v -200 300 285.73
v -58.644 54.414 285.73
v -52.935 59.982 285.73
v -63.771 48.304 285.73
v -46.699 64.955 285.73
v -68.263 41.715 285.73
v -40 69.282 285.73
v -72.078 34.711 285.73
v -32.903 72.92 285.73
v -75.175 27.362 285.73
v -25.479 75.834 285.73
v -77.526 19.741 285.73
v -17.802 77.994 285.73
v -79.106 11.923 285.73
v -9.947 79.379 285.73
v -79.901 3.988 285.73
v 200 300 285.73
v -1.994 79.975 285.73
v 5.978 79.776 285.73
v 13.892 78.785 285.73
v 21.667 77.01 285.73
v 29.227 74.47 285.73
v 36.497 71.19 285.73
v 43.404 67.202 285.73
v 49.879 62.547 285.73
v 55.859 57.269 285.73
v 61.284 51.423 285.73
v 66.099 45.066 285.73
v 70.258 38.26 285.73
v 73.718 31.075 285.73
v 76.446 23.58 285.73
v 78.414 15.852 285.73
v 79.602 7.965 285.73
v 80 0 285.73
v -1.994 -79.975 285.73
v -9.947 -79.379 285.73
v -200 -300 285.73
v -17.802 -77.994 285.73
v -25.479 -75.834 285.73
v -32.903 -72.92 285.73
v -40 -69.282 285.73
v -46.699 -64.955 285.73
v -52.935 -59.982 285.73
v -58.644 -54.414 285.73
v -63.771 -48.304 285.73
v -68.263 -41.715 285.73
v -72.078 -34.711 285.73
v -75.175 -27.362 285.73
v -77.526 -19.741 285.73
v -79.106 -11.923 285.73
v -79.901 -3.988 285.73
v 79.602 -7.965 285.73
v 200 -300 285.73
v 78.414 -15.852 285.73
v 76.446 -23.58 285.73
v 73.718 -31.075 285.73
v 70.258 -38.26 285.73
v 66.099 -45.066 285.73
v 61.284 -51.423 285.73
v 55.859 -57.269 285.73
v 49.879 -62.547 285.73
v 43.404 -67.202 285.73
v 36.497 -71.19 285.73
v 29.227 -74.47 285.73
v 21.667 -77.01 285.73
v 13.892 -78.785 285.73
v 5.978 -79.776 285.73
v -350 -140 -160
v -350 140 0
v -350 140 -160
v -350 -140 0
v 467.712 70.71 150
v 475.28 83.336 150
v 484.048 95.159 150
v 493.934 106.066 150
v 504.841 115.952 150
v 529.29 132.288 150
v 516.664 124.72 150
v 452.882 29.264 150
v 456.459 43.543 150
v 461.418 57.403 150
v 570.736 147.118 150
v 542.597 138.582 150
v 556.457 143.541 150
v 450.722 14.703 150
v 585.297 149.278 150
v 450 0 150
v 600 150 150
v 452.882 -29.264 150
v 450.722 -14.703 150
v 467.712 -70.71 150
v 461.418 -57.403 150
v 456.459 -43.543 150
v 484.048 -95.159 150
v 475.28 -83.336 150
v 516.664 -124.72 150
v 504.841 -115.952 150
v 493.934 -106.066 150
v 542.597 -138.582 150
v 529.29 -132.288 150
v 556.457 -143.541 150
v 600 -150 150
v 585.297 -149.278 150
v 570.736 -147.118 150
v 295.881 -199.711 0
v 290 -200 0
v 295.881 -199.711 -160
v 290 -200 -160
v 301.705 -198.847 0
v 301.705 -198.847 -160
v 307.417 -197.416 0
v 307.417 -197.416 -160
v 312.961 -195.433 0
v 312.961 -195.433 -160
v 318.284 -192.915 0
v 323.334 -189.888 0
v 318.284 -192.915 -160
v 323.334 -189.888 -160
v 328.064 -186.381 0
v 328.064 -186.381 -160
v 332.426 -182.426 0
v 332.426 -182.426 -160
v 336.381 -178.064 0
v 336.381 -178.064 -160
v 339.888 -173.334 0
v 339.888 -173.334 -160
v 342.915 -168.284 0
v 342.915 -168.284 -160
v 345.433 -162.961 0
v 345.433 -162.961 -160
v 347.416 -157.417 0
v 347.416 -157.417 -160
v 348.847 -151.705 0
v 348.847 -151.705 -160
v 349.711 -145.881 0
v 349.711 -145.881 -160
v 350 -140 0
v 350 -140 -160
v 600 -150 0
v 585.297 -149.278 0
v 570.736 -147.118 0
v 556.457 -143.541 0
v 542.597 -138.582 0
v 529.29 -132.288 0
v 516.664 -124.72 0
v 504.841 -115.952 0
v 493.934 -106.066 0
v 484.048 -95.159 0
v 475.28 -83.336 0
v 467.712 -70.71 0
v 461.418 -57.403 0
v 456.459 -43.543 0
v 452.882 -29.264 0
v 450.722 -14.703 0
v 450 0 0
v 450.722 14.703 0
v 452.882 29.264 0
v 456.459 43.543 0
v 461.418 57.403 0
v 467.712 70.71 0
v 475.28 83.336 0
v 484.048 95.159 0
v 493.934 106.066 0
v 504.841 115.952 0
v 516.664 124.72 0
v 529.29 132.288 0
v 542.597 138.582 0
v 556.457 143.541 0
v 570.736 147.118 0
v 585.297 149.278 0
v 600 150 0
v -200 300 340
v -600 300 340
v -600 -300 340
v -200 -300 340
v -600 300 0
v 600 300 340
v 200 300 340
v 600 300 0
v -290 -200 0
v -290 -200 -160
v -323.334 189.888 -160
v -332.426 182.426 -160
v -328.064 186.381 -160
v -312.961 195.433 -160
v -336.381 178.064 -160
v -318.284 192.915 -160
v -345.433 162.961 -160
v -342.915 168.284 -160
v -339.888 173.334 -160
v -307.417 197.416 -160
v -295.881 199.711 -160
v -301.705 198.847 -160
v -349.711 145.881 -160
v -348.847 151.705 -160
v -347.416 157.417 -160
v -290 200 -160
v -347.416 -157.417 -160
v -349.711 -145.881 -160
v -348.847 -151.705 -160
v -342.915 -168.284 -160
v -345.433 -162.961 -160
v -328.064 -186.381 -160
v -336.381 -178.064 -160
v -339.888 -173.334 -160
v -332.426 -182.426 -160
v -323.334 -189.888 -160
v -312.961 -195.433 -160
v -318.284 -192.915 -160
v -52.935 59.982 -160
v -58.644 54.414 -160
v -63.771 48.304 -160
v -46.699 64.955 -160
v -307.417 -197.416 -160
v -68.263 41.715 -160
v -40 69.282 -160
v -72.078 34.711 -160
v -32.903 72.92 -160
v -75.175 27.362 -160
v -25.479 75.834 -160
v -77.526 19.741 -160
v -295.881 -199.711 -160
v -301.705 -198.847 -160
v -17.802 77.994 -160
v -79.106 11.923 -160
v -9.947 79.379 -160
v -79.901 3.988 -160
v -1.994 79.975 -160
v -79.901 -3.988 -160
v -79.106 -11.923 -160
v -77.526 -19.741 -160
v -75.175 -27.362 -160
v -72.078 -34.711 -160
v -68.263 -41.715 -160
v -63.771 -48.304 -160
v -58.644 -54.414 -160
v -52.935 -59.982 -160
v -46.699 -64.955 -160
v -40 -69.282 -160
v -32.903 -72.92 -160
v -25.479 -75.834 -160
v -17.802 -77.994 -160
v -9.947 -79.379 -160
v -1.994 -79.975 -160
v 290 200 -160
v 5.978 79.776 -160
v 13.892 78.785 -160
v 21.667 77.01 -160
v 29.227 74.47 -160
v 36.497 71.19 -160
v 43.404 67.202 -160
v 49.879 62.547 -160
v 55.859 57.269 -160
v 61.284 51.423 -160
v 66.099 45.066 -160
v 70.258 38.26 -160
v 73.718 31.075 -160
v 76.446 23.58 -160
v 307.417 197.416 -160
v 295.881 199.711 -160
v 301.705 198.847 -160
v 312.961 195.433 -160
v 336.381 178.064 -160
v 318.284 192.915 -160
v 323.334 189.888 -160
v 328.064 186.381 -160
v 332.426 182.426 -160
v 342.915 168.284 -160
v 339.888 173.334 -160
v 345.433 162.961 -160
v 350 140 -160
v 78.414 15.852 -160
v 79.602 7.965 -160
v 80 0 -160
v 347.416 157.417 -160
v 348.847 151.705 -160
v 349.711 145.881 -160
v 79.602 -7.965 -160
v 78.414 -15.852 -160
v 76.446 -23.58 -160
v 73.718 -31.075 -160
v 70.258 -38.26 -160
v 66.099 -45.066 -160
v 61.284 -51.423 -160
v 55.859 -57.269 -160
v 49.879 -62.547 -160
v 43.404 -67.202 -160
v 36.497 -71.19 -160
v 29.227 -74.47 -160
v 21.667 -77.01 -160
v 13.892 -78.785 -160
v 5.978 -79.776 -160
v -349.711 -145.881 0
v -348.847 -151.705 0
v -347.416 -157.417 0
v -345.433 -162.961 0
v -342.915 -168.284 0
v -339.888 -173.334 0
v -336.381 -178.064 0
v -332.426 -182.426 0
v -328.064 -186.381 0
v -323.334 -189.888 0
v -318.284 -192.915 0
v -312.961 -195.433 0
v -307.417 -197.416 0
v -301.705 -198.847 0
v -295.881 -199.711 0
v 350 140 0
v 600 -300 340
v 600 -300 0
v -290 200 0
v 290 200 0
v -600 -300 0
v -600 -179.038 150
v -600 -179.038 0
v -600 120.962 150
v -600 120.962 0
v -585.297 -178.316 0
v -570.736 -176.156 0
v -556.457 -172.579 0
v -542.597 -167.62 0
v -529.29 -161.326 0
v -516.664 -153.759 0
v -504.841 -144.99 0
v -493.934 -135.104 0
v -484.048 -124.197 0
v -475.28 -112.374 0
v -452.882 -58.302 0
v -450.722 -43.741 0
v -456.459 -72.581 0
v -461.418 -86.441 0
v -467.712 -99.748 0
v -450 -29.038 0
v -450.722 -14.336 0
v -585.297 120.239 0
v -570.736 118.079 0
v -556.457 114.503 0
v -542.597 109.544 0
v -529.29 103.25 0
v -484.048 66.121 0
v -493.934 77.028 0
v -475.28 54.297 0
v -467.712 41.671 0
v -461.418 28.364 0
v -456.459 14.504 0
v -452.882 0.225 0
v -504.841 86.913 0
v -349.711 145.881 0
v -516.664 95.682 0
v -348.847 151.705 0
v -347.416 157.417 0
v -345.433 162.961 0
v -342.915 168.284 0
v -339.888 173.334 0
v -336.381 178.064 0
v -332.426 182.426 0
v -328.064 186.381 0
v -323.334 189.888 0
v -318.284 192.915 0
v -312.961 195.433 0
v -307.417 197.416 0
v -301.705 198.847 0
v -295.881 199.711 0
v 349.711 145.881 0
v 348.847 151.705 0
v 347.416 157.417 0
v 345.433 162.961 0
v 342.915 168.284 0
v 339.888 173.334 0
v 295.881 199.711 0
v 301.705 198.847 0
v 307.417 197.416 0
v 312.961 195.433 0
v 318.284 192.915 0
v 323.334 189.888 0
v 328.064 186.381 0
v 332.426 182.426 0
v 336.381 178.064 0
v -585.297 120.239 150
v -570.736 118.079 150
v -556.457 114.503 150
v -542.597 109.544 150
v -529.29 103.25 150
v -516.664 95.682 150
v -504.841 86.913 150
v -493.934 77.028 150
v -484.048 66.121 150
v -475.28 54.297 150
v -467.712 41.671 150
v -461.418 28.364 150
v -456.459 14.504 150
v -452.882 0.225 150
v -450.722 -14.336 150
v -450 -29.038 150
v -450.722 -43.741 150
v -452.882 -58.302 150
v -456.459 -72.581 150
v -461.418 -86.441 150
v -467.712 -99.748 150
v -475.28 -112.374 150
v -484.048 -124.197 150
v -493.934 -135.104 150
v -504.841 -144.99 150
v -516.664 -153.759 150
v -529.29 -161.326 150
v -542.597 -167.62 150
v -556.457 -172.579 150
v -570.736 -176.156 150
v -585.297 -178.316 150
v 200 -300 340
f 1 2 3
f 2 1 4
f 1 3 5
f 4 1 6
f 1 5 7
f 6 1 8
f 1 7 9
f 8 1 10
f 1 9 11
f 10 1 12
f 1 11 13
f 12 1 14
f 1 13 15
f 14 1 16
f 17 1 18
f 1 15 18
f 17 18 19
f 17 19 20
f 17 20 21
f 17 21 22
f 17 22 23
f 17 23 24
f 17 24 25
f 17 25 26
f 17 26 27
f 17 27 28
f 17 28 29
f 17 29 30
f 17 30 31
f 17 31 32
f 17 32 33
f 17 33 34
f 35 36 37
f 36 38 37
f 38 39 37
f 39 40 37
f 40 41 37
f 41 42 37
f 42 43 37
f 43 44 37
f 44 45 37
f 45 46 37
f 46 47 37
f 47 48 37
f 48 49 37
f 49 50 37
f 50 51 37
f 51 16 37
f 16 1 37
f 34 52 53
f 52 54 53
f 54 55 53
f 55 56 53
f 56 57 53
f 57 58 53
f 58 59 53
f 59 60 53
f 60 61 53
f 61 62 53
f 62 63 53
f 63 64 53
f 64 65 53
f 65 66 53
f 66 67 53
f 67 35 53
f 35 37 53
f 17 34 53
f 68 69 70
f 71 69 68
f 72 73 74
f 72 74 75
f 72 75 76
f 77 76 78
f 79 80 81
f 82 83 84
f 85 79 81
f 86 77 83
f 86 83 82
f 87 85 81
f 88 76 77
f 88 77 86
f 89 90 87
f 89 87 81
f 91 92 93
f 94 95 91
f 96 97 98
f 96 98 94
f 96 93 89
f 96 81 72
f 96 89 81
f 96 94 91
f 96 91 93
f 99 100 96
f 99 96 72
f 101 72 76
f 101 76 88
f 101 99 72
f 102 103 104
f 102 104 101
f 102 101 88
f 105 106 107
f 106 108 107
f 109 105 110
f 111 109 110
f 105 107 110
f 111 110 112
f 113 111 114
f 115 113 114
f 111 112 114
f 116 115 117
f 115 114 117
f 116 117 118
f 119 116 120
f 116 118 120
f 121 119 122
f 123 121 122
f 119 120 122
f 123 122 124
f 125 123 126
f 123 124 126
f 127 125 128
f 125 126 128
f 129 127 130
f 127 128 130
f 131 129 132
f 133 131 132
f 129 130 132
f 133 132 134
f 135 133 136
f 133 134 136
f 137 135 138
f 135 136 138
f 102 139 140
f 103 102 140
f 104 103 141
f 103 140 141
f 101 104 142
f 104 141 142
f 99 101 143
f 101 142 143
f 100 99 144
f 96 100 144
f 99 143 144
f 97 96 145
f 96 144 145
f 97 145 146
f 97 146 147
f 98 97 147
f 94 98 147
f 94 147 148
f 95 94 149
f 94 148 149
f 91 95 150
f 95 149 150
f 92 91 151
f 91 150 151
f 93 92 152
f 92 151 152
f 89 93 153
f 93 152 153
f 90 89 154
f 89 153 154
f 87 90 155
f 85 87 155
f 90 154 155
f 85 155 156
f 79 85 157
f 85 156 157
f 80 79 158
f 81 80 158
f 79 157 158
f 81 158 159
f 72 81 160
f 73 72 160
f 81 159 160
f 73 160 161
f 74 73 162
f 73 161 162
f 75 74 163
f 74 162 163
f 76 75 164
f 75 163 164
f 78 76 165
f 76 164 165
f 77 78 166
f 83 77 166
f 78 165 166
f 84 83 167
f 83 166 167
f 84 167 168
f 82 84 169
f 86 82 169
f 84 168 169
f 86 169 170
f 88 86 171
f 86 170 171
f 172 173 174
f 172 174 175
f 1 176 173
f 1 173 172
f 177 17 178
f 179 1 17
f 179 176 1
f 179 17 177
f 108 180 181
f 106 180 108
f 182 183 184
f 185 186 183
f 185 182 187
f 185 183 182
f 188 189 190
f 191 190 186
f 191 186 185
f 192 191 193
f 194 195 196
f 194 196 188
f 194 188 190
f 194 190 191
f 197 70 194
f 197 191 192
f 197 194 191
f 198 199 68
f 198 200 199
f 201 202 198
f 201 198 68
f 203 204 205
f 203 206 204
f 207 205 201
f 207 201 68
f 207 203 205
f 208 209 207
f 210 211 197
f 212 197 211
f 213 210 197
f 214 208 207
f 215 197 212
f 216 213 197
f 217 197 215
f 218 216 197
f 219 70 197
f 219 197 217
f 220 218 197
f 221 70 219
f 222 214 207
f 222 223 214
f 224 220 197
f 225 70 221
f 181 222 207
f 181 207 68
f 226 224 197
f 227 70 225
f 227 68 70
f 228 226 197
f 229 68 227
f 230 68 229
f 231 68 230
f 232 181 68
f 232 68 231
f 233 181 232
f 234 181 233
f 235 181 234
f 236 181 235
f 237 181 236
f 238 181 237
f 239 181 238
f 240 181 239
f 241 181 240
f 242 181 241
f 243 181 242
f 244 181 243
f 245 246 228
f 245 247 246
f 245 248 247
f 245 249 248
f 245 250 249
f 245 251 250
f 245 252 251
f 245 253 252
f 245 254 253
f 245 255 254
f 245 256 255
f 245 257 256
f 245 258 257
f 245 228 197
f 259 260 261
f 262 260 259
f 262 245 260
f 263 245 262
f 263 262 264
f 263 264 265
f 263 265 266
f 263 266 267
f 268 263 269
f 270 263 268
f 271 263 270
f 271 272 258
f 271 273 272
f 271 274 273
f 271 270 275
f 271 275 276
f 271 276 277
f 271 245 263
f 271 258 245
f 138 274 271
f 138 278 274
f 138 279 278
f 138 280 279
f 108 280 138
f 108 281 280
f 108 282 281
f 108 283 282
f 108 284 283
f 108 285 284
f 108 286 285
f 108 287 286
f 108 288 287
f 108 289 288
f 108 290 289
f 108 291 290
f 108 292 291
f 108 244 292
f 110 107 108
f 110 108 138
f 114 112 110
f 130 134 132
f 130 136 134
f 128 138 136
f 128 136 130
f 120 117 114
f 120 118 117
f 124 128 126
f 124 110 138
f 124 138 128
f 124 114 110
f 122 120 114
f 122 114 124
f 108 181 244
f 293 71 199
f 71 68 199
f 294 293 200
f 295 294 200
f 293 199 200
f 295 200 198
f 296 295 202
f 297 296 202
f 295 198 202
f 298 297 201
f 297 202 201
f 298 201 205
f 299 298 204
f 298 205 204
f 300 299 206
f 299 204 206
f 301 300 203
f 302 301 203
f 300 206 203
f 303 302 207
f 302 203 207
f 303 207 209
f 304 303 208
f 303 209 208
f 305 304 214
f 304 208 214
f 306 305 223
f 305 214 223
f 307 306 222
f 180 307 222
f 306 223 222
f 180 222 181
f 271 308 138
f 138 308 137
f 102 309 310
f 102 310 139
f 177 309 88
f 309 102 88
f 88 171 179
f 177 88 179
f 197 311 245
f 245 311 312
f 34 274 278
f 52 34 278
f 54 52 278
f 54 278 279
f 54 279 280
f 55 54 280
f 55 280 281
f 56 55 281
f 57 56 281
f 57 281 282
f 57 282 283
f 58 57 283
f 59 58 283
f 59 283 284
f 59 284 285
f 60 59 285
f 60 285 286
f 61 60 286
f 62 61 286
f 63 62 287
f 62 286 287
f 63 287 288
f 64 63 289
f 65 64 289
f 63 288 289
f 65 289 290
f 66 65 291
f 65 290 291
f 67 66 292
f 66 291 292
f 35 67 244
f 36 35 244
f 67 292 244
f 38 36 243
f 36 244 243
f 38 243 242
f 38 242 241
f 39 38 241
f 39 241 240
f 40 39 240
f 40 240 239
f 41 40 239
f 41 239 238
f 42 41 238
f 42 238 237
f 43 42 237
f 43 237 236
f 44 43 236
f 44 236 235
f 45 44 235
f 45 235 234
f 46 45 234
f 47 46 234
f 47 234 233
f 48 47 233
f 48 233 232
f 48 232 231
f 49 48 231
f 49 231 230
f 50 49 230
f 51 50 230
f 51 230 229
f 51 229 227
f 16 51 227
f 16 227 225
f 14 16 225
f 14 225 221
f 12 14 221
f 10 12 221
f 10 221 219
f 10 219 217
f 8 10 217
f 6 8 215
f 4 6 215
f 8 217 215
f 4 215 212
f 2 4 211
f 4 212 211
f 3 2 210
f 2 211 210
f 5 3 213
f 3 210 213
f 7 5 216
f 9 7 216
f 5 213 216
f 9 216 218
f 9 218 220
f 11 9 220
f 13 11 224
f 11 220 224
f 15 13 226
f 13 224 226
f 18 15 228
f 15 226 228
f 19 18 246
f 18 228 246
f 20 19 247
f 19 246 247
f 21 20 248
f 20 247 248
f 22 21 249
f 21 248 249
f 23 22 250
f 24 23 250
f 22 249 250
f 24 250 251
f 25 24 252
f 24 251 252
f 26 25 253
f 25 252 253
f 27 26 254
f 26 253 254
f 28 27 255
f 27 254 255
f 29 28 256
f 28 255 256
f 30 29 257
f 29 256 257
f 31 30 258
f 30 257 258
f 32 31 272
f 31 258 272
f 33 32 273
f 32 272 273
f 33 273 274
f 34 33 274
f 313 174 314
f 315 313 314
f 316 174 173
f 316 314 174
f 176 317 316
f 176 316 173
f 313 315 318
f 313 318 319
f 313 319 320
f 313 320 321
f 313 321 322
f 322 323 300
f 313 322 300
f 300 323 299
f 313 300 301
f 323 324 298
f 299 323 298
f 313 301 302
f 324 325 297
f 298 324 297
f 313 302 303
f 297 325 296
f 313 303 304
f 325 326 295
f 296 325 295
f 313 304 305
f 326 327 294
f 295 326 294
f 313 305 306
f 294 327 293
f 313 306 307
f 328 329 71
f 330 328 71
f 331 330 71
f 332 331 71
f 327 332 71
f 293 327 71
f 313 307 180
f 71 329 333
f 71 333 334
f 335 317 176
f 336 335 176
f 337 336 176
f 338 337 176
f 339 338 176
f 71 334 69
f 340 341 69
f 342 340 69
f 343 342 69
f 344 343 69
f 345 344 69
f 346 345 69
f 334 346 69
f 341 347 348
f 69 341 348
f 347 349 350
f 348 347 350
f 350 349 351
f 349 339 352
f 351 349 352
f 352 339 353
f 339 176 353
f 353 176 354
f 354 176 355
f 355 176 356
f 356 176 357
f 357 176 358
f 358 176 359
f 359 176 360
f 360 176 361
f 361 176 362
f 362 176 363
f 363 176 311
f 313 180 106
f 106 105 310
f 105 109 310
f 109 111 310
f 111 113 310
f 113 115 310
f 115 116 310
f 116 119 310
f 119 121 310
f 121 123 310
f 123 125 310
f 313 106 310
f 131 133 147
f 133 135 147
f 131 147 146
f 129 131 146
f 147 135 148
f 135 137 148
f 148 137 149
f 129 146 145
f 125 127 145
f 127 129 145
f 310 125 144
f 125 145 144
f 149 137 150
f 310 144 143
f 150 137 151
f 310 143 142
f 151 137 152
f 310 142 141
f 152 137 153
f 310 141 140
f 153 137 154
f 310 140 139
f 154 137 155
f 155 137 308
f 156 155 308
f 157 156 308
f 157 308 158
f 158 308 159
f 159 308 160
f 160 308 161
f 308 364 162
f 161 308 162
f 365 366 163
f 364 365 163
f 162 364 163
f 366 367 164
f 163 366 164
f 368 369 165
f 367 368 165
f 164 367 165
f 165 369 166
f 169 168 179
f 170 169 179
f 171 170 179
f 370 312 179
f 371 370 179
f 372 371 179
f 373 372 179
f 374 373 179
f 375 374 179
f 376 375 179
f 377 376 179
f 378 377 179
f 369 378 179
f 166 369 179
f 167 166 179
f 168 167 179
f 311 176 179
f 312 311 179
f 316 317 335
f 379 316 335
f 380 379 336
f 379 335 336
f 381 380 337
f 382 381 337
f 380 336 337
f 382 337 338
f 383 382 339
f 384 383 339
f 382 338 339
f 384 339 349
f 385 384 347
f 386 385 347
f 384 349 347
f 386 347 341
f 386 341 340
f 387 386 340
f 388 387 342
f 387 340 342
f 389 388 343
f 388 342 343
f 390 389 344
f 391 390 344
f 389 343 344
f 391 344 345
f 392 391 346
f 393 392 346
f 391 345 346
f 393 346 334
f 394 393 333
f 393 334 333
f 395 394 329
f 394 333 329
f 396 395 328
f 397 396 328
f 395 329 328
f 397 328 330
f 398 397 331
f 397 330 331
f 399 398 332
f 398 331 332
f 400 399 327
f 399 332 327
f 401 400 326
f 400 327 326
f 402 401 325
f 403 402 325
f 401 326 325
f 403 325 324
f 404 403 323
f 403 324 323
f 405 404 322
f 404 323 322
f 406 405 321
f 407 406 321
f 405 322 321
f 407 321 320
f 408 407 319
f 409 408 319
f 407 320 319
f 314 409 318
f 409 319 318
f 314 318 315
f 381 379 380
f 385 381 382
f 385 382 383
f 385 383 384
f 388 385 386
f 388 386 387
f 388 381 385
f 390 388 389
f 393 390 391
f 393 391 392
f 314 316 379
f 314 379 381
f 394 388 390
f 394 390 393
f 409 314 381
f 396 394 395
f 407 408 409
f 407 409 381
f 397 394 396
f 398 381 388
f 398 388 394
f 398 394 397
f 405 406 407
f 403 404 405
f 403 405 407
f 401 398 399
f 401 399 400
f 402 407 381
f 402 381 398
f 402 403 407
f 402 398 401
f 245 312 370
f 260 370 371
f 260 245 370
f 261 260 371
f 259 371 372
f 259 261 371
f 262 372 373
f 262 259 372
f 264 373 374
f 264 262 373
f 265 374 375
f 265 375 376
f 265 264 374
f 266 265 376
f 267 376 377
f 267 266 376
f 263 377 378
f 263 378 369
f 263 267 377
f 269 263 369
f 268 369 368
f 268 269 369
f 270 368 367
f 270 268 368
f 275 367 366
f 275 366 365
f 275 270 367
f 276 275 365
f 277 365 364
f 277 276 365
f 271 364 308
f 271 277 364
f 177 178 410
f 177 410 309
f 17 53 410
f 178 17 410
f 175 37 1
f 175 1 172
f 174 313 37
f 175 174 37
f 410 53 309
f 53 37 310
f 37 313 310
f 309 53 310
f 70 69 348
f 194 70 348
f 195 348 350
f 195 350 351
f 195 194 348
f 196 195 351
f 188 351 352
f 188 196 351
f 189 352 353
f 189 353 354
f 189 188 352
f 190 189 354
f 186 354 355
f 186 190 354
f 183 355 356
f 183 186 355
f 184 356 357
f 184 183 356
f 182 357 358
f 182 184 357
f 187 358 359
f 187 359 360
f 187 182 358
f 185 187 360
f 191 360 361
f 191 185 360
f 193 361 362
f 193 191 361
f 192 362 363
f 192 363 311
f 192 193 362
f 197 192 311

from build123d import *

# Parameters (mm, degrees)
F0_W      = 1200
F0_H      = 600
F1_DEPTH  = 340
F2_W      = 400
F2_H      = 54.2701794954
F3_DEPTH  = 600
F4_W      = 700
F4_H      = 400
F5_DEPTH  = 160
F6_R      = 80
F7_DEPTH  = 500.001
F9_DEPTH  = 150
F10_R     = 60
F11_DEPTH = 150


with BuildPart() as f1:
    # F0 (on Top) → F1 (new body)
    with BuildSketch(Plane.XY):
        Rectangle(F0_W, F0_H)
    extrude(amount=F1_DEPTH)

    # F2 (on face) → F3 (cut)
    with BuildSketch(Plane.XZ.offset(300)):
        with Locations((0, 312.8649102523)):
            Rectangle(F2_W, F2_H)
    extrude(amount=-F3_DEPTH, mode=Mode.SUBTRACT)

    # F4 (on face) → F5 (join)
    with BuildSketch(Plane(origin=(0, 0, 0), x_dir=(1, 0, 0), z_dir=(0, 0, -1))):
        Rectangle(F4_W, F4_H)
    extrude(amount=F5_DEPTH)

    # F6 (on face) → F7 (cut, through all)
    with BuildSketch(Plane(origin=(0, 0, -160), x_dir=(1, 0, 0), z_dir=(0, 0, -1))):
        Circle(F6_R)
    extrude(amount=-F7_DEPTH, mode=Mode.SUBTRACT)

    # F8 (on face) → F9 (cut)
    with BuildSketch(Plane(origin=(0, 0, 0), x_dir=(1, 0, 0), z_dir=(0, 0, -1))):
        with BuildLine():
            Line((600, -150), (600, 150))
            ThreePointArc((600, 150), (450, 0), (600, -150))
        make_face()
    extrude(amount=-F9_DEPTH, mode=Mode.SUBTRACT)

    # F10
    f10_edges = [f1.edges().sort_by_distance(p)[0] for p in [
        (-350, 200, -80),
        (350, 200, -80),
        (350, -200, -80),
        (-350, -200, -80),
    ]]
    fillet(f10_edges, radius=F10_R)

    # F8 (on face) → F11 (cut)
    with BuildSketch(Plane(origin=(0, 0, 0), x_dir=(1, 0, 0), z_dir=(0, 0, -1))):
        with BuildLine():
            ThreePointArc((-600, -120.9617067128), (-493.933982822, -77.0277238908), (-450, 29.0382932872))
            ThreePointArc((-450, 29.0382932872), (-493.933982822, 135.1043104651), (-600, 179.0382932872))
            Line((-600, 179.0382932872), (-600, -120.9617067128))
        make_face()
    extrude(amount=-F11_DEPTH, mode=Mode.SUBTRACT)


solid = f1.part
